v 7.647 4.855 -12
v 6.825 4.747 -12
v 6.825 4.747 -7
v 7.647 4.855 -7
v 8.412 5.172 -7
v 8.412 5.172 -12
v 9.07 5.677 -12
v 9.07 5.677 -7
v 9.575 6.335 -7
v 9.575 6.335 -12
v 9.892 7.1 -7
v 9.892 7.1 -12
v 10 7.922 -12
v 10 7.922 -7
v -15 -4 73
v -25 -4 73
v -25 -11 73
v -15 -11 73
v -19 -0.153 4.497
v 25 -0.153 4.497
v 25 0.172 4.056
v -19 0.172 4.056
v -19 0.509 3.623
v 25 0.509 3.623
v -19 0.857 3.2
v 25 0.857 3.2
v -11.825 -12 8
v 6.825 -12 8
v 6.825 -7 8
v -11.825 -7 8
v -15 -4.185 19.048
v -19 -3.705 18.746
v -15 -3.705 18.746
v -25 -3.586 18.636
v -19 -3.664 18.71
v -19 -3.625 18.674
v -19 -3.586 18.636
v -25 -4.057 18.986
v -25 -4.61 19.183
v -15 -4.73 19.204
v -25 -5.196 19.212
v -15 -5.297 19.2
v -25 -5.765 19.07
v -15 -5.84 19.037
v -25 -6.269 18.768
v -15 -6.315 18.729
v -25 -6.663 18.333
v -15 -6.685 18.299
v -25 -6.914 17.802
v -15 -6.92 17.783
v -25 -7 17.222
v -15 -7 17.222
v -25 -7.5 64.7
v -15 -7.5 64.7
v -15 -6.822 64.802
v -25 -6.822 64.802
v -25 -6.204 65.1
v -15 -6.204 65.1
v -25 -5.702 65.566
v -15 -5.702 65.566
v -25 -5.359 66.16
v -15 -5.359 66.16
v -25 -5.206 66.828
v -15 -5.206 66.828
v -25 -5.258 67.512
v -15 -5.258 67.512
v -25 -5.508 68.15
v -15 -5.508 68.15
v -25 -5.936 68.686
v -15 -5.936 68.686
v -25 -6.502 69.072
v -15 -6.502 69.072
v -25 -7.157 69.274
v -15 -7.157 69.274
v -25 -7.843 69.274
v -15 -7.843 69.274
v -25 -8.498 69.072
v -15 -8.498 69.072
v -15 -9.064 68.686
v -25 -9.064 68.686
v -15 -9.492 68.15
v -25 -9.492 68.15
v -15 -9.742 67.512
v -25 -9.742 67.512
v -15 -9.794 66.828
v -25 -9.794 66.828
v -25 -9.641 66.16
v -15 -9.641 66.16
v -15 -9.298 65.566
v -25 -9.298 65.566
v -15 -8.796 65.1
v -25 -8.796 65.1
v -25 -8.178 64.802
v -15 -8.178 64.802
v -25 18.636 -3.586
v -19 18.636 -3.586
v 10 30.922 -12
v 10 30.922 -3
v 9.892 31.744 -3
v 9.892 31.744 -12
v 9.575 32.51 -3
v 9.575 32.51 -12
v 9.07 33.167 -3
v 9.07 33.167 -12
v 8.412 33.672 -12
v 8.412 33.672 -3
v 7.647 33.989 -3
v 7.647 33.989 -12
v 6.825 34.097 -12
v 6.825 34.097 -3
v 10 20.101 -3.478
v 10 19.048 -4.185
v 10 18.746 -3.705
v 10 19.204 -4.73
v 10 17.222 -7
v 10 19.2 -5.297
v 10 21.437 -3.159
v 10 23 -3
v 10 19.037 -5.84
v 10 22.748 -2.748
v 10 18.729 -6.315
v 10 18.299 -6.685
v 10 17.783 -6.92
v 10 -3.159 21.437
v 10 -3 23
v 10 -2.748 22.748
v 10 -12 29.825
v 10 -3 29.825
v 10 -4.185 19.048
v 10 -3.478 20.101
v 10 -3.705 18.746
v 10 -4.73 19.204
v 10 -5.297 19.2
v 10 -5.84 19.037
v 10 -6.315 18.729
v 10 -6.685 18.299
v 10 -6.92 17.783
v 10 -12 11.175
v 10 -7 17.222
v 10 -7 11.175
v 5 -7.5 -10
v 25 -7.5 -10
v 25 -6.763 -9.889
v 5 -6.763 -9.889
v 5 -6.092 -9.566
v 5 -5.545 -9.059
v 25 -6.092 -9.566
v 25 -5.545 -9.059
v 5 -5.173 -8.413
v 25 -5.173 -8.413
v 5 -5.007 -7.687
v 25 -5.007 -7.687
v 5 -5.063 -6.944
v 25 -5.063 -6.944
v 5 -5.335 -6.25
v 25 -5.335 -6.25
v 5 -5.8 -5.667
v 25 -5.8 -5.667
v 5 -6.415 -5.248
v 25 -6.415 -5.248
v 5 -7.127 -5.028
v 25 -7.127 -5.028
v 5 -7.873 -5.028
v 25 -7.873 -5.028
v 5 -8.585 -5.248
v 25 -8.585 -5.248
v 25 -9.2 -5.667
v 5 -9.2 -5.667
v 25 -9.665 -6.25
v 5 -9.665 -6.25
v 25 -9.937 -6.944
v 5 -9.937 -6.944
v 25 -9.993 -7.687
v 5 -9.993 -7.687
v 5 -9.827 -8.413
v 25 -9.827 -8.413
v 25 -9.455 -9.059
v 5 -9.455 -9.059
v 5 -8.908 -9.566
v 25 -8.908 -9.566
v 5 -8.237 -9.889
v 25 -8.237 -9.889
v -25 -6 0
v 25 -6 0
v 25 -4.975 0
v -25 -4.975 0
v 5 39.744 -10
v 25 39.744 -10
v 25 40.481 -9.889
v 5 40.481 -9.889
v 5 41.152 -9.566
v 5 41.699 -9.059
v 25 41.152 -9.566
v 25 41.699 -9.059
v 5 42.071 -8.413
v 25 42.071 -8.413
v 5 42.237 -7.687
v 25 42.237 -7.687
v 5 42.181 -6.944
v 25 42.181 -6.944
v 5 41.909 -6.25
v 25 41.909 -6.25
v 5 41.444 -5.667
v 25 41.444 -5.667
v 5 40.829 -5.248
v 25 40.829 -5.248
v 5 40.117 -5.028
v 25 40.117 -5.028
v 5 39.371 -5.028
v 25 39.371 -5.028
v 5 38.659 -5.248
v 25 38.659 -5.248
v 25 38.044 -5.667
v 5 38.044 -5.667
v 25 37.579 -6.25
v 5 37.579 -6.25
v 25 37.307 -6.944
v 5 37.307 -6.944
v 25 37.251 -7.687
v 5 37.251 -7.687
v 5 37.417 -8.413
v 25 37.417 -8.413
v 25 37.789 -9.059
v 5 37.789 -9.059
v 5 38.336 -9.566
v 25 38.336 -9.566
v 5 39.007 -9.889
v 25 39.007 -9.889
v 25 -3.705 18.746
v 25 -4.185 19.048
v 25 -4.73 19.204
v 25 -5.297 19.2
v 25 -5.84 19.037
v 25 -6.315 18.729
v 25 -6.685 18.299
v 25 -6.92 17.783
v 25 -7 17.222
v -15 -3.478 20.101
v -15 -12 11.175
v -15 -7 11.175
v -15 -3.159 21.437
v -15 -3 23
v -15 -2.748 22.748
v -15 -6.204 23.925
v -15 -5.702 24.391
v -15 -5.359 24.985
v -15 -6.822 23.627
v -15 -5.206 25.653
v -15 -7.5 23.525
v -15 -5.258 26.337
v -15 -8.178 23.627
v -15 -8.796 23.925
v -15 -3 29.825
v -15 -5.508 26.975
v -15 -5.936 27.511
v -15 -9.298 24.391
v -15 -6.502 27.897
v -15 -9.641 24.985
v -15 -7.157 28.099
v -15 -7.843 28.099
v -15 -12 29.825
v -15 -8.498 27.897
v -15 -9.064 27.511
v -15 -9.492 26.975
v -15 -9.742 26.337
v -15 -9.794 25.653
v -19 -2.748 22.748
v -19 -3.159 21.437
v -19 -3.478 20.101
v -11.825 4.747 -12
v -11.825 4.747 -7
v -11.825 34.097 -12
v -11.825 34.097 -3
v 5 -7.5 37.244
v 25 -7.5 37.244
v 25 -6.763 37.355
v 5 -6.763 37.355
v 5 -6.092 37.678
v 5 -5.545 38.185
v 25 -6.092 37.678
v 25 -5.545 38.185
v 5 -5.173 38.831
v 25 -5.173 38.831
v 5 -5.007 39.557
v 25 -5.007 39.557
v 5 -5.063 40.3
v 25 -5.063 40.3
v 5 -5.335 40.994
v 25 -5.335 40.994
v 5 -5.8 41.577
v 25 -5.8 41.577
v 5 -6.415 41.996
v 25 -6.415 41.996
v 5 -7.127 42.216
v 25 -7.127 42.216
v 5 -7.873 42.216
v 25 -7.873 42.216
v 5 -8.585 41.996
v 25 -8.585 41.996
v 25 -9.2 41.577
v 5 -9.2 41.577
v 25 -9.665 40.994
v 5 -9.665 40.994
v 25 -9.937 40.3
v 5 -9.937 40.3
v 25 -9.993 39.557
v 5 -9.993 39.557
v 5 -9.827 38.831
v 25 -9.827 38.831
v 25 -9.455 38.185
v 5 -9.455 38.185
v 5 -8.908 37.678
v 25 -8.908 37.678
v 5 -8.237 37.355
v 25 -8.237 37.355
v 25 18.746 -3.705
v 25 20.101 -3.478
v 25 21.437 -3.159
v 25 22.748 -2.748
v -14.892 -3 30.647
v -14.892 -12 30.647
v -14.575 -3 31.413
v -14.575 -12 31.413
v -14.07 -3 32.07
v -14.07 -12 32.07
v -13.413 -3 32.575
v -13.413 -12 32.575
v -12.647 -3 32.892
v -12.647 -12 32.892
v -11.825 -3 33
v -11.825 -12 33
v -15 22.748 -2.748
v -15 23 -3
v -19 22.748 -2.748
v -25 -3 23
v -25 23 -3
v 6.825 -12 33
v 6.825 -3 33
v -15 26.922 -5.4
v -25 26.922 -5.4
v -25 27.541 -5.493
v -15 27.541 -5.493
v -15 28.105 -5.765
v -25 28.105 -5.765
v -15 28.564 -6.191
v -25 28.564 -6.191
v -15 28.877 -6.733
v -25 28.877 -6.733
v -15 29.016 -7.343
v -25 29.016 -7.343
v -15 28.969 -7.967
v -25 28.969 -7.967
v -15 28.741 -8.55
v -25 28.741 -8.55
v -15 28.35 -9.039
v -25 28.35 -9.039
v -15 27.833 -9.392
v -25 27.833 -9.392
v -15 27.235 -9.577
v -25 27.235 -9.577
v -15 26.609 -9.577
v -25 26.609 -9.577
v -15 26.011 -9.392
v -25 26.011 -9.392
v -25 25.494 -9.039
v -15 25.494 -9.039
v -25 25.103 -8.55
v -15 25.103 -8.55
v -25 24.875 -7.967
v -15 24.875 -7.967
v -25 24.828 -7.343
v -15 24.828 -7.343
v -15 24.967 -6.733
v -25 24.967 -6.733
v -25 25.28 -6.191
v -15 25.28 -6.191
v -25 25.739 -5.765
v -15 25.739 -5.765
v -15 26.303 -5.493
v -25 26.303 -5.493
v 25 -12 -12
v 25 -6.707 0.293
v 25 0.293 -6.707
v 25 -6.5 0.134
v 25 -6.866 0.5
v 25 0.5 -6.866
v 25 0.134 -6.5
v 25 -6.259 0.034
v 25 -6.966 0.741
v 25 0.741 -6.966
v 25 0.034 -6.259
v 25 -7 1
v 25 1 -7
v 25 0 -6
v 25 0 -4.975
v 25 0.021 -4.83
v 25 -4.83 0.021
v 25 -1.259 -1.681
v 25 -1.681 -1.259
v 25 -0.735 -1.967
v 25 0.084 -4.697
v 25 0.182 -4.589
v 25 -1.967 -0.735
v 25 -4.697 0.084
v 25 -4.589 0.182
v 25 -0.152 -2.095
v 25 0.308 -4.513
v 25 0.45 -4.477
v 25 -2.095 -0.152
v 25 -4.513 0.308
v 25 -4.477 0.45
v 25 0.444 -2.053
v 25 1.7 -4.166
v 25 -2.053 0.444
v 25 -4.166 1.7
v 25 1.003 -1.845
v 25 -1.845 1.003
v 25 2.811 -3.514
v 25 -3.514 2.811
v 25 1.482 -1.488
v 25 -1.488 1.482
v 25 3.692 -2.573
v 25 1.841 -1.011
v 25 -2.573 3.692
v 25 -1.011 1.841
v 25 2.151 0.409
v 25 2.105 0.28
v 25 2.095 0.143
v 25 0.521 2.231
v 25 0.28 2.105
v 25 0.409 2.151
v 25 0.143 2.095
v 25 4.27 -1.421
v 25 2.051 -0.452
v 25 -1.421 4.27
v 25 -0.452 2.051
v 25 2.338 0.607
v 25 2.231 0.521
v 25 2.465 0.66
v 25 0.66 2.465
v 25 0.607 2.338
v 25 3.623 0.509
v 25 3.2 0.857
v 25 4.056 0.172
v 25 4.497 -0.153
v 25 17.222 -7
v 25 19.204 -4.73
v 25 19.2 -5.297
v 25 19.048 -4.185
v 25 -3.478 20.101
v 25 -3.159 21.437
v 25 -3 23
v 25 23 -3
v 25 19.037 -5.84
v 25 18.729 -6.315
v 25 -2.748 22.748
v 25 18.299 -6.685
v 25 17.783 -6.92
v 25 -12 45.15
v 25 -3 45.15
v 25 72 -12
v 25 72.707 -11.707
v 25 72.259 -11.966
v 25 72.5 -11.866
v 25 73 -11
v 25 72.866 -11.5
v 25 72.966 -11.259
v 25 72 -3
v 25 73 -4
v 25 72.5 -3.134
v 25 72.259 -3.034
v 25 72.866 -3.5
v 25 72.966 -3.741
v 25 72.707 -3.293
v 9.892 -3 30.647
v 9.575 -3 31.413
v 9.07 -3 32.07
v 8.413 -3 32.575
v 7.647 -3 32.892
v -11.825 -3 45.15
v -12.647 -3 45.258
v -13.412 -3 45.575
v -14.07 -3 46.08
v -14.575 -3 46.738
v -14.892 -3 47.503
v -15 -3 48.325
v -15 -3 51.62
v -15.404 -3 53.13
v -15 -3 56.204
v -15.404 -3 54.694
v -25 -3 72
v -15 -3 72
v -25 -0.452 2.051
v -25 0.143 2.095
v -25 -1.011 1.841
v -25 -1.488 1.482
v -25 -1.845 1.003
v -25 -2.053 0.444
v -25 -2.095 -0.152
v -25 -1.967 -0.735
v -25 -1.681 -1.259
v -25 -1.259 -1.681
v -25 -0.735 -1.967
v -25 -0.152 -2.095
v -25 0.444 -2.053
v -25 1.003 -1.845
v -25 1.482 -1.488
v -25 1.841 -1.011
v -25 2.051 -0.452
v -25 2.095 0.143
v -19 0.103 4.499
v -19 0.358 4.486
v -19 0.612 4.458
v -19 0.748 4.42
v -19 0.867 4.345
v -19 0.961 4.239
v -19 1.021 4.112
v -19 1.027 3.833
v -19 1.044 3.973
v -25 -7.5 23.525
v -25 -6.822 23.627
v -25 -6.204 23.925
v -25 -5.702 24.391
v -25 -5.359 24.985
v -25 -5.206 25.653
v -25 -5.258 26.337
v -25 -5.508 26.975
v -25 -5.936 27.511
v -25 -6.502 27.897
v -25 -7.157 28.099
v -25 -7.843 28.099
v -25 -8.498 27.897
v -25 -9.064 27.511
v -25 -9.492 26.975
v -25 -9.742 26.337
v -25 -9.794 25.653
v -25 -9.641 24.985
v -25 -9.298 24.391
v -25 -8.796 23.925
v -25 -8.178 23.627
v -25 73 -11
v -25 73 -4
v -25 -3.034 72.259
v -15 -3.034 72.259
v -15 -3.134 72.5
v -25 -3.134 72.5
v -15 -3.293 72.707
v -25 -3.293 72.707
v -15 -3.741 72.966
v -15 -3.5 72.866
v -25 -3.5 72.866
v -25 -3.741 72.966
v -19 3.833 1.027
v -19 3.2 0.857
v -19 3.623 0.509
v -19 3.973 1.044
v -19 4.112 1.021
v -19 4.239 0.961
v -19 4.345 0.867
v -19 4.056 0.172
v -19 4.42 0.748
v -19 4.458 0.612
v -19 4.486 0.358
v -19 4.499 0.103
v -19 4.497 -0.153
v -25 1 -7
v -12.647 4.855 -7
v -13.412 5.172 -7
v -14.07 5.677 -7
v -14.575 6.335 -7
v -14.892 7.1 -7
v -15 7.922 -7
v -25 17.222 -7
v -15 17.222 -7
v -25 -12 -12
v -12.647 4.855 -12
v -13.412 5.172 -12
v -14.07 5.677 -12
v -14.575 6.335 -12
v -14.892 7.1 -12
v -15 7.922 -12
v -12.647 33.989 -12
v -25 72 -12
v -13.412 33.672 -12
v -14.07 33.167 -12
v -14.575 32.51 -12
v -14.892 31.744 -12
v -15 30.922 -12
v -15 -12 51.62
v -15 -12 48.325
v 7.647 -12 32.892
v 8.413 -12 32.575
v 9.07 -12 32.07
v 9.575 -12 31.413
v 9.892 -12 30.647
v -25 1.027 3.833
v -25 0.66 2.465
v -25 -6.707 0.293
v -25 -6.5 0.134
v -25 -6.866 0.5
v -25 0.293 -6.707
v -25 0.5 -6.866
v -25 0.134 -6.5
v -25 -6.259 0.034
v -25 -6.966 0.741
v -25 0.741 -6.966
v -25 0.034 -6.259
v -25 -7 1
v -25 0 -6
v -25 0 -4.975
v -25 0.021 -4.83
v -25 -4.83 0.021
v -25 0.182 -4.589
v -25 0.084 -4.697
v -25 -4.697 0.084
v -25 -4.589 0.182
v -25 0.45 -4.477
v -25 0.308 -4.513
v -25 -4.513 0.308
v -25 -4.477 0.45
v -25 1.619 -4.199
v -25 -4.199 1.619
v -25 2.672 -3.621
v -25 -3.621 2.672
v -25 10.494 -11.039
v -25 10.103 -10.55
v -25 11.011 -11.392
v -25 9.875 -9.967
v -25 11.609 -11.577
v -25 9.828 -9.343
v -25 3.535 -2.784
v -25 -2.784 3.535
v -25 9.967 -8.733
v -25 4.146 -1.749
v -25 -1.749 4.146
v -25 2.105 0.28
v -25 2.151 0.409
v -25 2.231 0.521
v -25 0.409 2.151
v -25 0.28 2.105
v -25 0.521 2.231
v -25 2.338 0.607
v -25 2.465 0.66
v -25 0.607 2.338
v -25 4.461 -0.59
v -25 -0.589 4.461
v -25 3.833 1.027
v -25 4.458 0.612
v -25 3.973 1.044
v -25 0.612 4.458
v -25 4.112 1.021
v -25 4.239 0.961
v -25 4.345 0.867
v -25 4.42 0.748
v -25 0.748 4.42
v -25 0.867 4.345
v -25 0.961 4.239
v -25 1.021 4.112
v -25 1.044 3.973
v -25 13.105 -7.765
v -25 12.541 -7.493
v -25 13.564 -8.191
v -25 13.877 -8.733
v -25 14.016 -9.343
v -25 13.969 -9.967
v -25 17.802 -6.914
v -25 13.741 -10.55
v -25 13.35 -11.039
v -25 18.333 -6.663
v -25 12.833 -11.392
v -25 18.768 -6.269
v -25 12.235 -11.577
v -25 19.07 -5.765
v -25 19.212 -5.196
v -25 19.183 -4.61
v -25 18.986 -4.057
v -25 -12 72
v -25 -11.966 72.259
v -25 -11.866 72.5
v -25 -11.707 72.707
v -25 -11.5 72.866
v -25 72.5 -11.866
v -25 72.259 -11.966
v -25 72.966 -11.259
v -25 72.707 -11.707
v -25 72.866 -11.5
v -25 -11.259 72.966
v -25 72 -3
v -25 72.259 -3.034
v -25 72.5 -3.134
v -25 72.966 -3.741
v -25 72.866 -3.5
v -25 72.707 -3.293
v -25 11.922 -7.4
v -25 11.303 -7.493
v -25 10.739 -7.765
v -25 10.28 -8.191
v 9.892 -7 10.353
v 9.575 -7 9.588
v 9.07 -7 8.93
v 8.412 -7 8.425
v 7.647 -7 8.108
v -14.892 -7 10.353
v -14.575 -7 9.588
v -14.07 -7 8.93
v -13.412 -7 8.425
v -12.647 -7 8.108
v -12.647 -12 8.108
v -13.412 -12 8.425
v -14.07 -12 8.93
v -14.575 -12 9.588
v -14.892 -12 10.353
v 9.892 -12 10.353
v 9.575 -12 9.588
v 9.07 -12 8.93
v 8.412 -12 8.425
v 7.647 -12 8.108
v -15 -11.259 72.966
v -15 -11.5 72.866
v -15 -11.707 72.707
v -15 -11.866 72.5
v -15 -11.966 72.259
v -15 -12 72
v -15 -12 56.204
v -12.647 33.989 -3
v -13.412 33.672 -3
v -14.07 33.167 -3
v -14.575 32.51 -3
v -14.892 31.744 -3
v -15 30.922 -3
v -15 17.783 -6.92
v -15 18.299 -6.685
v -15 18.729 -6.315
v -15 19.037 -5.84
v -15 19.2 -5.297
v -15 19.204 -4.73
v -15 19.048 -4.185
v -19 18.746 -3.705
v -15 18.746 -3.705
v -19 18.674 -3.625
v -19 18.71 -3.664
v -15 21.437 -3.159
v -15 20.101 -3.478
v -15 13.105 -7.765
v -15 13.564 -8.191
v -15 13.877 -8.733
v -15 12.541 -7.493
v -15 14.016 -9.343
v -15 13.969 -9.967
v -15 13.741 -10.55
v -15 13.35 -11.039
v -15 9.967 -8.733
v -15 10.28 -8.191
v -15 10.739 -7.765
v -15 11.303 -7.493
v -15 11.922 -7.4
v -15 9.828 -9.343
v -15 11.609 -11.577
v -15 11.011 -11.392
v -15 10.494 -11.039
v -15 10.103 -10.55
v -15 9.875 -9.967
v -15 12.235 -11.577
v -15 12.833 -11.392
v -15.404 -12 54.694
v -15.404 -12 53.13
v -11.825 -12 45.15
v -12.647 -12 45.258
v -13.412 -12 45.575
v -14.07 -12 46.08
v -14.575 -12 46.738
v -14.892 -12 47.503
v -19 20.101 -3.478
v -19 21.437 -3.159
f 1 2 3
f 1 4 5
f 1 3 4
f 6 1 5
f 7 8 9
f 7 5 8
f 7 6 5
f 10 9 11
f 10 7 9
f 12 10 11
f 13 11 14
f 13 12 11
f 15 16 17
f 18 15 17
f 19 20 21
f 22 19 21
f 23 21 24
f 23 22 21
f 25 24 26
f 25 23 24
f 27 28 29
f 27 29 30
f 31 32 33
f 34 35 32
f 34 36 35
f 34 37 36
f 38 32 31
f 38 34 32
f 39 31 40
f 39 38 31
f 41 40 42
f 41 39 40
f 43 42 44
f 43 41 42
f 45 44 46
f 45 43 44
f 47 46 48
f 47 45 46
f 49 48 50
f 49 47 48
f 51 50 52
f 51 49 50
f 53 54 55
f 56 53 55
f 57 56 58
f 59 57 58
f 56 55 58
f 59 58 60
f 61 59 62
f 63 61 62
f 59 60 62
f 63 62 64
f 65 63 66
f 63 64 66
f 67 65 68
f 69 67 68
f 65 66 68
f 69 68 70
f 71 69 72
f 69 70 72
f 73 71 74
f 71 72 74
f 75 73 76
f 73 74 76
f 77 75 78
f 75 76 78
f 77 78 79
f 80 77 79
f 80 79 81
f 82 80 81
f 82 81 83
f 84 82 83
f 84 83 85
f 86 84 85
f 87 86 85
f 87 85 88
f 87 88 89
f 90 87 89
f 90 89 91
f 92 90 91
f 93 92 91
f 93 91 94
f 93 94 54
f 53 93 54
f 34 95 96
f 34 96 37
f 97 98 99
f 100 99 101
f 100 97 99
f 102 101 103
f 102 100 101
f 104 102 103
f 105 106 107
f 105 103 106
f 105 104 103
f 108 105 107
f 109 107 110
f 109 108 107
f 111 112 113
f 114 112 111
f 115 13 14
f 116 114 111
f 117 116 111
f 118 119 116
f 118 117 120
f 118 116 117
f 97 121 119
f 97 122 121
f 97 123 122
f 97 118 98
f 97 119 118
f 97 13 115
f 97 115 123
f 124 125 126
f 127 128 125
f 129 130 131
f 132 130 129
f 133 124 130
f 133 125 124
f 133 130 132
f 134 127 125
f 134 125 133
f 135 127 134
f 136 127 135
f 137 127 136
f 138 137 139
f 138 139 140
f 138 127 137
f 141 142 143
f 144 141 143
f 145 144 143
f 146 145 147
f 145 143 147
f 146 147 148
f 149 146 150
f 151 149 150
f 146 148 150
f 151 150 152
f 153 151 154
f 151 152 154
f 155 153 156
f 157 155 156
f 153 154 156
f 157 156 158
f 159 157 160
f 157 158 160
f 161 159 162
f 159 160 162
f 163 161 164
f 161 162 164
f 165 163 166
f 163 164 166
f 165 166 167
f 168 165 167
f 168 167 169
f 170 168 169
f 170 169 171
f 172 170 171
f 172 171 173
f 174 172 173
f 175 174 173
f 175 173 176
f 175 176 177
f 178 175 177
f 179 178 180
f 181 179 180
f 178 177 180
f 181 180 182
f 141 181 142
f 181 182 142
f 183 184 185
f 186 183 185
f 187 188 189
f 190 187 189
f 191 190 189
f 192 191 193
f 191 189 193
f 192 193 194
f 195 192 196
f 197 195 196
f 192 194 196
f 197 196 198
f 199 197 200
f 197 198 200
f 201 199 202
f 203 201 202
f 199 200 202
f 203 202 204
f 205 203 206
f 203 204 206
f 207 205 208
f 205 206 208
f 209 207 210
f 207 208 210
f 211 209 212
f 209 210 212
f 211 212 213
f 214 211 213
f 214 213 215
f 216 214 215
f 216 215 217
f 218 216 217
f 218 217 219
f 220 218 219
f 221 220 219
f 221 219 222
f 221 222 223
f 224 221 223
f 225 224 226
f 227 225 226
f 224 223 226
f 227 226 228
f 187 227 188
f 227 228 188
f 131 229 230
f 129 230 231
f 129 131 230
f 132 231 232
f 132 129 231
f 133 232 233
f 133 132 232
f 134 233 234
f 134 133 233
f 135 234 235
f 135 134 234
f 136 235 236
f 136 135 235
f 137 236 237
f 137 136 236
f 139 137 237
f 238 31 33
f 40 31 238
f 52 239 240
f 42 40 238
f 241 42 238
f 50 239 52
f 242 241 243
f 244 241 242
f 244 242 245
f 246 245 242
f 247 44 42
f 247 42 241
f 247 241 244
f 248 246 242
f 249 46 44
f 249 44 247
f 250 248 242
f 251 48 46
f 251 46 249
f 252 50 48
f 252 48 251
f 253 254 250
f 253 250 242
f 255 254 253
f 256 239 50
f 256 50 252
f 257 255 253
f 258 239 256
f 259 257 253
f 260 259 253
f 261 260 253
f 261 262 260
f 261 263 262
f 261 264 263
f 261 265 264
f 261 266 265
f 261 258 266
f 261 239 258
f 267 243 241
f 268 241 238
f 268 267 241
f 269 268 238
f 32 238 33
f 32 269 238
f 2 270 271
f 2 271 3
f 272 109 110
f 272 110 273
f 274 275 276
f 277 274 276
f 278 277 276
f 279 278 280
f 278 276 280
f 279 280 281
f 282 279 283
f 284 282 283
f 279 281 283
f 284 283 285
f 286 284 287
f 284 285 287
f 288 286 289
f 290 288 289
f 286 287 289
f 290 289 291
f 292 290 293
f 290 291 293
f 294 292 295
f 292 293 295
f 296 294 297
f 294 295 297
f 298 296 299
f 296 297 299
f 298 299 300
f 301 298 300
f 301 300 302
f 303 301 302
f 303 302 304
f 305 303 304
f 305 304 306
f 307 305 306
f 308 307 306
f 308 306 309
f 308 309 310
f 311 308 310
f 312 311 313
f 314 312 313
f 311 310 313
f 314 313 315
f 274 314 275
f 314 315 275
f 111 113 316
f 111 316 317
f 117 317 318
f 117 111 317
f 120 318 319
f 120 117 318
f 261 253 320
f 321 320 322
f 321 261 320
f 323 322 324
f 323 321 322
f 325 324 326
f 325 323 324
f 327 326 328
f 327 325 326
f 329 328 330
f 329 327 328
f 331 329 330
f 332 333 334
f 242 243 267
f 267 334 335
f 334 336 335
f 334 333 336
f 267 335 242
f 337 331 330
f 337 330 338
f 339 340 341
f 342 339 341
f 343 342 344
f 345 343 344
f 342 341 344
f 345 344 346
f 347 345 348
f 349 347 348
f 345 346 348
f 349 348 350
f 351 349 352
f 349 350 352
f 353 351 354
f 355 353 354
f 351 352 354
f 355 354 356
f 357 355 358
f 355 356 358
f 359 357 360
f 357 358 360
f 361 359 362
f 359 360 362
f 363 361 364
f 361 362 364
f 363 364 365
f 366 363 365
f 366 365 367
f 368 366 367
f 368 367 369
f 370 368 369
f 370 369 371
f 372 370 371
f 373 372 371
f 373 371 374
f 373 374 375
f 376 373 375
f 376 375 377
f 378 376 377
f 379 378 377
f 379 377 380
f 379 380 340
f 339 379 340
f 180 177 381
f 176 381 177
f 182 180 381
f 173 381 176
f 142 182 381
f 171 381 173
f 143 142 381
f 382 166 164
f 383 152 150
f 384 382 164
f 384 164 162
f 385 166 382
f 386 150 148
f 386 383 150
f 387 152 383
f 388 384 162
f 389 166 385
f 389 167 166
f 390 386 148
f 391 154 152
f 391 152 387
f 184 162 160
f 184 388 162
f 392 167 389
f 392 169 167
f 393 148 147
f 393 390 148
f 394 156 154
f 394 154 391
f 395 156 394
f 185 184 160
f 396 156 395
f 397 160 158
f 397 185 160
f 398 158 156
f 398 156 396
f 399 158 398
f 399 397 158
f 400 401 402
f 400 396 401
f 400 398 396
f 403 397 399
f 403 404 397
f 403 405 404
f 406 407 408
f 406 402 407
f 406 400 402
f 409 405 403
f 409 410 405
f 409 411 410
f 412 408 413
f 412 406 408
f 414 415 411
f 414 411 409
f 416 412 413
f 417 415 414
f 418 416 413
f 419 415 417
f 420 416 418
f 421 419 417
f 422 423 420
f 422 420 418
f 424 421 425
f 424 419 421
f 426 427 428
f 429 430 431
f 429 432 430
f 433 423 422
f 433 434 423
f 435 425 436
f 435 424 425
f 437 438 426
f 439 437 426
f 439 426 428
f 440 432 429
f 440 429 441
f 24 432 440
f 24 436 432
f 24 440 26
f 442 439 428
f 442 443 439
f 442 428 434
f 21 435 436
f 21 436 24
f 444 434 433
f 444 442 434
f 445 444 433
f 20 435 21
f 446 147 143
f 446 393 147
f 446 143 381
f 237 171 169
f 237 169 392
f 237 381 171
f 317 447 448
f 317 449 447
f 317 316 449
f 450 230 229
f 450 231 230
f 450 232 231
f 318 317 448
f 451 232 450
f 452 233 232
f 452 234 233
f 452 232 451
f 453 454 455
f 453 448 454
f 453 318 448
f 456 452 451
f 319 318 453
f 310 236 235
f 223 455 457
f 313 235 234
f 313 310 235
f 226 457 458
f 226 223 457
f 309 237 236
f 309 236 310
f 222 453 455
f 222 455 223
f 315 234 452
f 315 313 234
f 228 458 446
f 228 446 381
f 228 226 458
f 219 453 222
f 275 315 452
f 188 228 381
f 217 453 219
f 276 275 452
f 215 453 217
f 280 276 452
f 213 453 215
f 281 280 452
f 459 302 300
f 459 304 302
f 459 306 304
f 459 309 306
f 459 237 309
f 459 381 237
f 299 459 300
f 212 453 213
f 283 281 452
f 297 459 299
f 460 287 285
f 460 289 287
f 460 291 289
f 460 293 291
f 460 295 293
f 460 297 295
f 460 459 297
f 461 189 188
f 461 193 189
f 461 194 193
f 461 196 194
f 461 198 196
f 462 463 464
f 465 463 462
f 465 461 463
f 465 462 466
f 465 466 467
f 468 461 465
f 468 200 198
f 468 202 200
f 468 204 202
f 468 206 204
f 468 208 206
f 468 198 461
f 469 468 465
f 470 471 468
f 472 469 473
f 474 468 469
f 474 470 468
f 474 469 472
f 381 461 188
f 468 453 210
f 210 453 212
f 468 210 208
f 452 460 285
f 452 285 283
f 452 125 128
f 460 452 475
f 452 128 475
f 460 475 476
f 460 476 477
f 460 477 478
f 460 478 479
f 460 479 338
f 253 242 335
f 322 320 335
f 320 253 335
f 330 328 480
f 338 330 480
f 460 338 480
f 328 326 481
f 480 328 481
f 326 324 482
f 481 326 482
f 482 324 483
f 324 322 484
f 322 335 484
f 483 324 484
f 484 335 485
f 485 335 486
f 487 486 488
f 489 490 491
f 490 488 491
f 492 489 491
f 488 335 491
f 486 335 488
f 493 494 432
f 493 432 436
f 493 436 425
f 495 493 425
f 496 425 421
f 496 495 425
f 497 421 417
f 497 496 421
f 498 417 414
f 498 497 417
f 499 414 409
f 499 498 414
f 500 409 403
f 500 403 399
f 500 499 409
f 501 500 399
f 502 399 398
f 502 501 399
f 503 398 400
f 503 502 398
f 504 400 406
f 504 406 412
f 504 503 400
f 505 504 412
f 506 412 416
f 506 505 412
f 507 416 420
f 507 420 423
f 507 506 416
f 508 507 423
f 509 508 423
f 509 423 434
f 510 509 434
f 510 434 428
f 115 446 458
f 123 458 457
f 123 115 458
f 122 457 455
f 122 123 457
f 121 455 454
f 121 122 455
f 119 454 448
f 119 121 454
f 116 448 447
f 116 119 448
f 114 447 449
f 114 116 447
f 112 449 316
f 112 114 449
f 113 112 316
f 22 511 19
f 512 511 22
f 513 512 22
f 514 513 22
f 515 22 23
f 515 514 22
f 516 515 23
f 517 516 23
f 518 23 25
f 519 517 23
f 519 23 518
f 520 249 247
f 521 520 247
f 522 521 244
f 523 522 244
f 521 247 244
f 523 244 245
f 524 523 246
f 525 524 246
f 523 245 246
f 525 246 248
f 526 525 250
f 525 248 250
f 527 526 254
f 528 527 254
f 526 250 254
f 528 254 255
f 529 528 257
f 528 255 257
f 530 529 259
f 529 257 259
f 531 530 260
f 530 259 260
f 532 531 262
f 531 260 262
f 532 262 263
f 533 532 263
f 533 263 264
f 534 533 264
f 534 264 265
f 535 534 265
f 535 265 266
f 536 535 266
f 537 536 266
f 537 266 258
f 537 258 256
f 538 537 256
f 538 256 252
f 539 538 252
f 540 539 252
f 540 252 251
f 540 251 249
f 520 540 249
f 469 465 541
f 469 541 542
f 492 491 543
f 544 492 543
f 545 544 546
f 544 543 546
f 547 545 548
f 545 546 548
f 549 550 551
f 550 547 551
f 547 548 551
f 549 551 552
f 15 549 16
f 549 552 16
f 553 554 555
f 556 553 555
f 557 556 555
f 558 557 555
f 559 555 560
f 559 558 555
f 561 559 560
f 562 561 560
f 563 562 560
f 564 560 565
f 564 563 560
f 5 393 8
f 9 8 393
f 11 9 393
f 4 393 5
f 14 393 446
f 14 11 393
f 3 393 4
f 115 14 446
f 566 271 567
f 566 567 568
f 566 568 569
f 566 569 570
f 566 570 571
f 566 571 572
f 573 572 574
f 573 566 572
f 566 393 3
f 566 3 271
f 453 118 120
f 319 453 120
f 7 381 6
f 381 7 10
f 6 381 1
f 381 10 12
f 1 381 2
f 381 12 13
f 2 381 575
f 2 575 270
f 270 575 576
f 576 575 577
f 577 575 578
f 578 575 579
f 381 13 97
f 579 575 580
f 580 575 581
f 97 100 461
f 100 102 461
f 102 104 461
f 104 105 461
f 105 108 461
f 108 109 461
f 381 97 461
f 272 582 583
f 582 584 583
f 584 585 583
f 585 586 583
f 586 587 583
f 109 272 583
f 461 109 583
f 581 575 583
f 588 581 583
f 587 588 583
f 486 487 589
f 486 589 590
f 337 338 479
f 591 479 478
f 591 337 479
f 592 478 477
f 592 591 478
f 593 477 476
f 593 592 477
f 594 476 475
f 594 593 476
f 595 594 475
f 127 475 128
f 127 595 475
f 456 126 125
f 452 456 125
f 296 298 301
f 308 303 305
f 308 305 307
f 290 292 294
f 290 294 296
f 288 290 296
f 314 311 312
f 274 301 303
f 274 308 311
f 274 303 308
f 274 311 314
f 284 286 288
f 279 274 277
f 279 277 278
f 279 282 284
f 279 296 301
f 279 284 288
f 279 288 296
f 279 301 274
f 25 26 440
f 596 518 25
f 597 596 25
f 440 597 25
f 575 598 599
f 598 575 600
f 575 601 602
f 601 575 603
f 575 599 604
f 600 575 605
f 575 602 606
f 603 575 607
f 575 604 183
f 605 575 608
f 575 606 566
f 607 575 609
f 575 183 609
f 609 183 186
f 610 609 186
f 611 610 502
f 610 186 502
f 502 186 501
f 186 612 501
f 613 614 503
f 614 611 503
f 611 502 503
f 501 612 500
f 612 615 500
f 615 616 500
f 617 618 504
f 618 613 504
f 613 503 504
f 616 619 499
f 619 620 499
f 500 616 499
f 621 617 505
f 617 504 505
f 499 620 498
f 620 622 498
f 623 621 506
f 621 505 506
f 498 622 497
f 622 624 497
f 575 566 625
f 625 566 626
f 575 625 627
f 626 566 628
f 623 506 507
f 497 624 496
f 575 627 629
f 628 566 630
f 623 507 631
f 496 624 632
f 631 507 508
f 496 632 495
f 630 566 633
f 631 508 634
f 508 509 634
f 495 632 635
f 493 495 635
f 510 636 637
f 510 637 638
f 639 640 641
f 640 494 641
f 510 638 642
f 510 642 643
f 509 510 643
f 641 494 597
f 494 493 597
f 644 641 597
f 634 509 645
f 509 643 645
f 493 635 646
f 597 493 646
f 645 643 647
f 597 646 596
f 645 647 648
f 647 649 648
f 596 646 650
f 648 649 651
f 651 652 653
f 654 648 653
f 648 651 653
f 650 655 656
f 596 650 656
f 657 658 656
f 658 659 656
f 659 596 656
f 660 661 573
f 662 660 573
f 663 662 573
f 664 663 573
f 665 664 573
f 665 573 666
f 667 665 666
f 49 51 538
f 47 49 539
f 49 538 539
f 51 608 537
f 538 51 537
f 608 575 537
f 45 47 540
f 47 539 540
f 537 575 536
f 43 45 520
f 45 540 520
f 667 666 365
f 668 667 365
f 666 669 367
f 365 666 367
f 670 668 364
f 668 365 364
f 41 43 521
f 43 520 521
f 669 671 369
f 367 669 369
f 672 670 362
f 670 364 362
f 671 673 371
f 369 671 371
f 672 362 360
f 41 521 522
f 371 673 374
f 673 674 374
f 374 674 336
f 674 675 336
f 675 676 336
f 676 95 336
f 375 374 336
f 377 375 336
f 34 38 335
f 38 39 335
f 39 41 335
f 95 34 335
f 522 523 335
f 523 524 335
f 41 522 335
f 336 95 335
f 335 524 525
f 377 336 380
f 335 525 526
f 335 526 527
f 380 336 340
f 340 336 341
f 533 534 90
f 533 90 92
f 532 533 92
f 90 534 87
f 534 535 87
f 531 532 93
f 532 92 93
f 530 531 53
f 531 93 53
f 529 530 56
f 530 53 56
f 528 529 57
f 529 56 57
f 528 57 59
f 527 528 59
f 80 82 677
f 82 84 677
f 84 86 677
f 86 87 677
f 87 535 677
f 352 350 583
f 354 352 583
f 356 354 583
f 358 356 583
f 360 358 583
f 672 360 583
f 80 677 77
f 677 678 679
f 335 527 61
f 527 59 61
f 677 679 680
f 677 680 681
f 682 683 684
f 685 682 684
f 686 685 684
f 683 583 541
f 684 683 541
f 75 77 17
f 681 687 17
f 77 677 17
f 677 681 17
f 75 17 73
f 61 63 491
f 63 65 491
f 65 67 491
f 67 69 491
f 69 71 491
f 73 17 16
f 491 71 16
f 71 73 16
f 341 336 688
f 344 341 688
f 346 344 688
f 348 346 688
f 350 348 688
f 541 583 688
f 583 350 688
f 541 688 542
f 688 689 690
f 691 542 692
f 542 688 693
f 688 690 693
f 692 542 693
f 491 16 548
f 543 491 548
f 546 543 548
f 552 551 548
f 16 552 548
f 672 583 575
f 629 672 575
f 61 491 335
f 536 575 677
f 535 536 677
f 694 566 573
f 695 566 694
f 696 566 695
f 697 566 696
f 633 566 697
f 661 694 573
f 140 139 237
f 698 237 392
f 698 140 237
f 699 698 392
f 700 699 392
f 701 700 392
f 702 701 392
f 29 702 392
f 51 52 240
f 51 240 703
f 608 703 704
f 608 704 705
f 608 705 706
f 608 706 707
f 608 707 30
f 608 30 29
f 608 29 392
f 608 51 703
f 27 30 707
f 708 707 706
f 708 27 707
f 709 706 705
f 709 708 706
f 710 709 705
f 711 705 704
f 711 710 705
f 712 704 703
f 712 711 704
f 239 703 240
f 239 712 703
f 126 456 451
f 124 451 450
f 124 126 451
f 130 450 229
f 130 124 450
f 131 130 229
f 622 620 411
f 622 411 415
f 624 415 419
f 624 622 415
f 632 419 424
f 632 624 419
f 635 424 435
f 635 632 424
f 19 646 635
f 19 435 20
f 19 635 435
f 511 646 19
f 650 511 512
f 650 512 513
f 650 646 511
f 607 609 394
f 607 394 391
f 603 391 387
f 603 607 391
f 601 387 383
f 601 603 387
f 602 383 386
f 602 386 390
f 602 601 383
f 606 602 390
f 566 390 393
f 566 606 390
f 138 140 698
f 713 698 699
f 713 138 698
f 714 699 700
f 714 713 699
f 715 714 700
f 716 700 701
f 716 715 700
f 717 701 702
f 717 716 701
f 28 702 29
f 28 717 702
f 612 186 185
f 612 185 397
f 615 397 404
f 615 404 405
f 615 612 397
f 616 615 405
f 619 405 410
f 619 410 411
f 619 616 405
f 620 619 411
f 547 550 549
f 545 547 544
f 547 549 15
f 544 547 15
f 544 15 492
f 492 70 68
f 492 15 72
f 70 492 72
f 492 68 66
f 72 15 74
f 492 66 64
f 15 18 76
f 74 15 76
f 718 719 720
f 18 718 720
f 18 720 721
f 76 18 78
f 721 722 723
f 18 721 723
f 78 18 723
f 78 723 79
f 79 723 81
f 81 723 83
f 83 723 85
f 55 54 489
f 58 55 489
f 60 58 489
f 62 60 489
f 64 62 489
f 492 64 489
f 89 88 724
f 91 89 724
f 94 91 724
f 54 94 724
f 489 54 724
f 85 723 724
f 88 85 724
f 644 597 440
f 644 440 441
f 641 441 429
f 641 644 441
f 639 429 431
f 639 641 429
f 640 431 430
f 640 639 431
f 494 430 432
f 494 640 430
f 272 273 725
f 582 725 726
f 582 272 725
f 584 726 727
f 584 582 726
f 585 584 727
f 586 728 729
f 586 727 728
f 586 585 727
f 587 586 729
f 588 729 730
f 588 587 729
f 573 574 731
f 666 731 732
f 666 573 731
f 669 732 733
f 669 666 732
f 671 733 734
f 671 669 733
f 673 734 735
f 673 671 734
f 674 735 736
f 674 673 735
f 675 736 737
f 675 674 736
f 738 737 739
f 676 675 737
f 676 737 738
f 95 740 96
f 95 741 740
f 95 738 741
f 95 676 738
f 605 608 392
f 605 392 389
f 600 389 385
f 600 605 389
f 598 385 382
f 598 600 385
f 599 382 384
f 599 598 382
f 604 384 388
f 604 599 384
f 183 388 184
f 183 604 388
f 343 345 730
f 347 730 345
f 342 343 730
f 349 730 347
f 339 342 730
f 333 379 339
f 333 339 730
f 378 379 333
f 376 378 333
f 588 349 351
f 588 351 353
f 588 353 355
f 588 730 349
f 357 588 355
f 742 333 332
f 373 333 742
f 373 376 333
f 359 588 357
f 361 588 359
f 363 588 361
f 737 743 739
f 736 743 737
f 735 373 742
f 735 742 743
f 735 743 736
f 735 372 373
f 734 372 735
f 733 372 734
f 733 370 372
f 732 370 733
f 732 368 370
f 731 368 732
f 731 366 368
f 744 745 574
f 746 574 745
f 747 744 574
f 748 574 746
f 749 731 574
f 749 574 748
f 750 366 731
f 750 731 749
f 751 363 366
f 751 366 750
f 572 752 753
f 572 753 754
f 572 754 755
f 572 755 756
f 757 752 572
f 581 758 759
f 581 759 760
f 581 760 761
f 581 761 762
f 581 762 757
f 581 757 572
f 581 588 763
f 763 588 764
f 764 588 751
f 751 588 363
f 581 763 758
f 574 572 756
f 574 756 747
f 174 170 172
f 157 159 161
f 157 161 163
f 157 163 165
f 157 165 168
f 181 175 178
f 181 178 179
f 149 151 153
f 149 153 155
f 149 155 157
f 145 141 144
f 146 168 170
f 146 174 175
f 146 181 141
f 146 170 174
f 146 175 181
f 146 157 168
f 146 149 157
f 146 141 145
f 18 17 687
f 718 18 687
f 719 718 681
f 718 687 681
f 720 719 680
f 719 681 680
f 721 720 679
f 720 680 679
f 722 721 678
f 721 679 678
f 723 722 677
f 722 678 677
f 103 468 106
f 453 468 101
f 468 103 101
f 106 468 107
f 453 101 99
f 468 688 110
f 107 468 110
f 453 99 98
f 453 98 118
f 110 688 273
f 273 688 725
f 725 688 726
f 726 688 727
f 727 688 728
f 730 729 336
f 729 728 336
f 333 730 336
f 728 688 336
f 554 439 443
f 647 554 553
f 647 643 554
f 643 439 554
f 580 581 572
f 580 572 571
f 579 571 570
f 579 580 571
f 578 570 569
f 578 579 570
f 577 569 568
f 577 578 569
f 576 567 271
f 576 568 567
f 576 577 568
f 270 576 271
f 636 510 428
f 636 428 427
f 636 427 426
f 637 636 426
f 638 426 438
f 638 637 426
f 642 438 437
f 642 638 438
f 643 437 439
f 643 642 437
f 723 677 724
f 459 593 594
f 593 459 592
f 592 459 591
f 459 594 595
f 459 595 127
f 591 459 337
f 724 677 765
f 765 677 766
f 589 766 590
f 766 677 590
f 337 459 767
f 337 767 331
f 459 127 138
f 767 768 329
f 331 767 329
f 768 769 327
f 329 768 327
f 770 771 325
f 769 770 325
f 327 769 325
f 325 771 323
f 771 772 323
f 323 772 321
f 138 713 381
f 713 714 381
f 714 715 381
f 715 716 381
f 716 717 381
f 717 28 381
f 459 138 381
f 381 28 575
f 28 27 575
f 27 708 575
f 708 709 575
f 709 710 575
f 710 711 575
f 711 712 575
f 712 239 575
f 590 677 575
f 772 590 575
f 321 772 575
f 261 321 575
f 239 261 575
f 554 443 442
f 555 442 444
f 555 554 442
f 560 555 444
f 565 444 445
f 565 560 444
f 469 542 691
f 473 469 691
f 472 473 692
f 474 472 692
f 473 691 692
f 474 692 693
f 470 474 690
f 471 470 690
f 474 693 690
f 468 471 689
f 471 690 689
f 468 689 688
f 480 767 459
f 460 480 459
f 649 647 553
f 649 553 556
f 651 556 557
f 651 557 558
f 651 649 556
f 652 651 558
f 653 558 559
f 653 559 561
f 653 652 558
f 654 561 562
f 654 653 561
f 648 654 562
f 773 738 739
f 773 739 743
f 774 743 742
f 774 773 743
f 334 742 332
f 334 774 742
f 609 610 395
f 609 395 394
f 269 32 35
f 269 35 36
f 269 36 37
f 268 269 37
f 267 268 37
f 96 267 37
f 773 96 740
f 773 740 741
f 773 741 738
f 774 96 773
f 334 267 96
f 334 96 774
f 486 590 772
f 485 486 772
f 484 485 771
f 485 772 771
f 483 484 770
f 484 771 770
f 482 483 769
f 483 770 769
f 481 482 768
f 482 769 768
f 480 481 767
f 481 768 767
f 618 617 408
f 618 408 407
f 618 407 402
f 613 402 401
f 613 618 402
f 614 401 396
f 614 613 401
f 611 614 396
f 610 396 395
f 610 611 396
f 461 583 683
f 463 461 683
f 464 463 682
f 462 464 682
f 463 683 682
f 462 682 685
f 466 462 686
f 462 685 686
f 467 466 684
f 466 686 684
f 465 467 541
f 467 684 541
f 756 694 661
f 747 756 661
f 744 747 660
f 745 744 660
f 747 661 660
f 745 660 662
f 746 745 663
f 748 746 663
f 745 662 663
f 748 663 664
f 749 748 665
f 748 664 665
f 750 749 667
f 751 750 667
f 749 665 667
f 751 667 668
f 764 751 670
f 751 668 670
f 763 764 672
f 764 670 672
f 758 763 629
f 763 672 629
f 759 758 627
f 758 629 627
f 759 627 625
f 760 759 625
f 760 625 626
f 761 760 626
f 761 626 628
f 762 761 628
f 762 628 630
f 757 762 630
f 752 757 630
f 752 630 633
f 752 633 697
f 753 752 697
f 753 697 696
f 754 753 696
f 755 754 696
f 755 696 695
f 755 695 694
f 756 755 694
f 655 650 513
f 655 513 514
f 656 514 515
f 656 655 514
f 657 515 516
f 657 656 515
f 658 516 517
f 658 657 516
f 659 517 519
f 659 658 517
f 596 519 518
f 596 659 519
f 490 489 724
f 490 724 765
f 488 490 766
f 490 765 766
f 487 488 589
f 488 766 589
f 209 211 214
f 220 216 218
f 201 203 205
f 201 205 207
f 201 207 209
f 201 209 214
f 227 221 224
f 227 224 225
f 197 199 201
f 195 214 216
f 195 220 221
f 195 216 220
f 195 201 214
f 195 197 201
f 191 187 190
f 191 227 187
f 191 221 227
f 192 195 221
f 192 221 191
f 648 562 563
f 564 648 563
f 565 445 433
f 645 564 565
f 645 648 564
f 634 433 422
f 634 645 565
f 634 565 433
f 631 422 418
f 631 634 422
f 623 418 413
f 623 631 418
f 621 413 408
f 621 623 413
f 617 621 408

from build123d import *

# Parameters (mm, degrees)
STRUCTURAL_MEMBER1_DEPTH = 50
SKETCH16_R               = 2.5
CUT_EXTRUDE2_DEPTH       = 20
CUT_EXTRUDE7_REACH       = 116.8
CUT_EXTRUDE8_REACH       = 116.708
SKETCH23_R               = 2.1
CUT_EXTRUDE9_REACH       = 116.8
CUT_EXTRUDE10_REACH      = 112.716
SKETCH25_R               = 2.3
SKETCH26_R               = 6
CUT_EXTRUDE11_DEPTH      = 115.799827021


with BuildPart() as part:
    # Sketch14 → Structural Member1 (new body)
    with BuildSketch(Plane.YZ.offset(-25)):
        with BuildLine():
            Line((-11.999992417, -11.999998055), (72.000007583, -11.999998055))
            ThreePointArc((72.000007583, -11.999998055), (72.707114364, -11.707104836), (73.000007583, -10.999998055))
            Line((73.000007583, -10.999998055), (73.000007583, -3.999995305))
            ThreePointArc((73.000007583, -3.999995305), (72.707113392, -3.292890301), (72.000007583, -2.999998055))
            Line((72.000007583, -2.999998055), (23.000007583, -2.999998055))
            Line((23.000007583, -2.999998055), (-2.999992417, 23.000001945))
            Line((-2.999992417, 23.000001945), (-2.999992417, 72.000001945))
            ThreePointArc((-2.999992417, 72.000001945), (-3.292885636, 72.707108727), (-3.999992417, 73.000001945))
            Line((-3.999992417, 73.000001945), (-10.999992417, 73.000001945))
            ThreePointArc((-10.999992417, 73.000001945), (-11.707099198, 72.707108727), (-11.999992417, 72.000001945))
            Line((-11.999992417, 72.000001945), (-11.999992417, -11.999998055))
        make_face()
        with BuildLine():
            Line((0.999999969, -6.999999689), (17.221834624, -6.999999689))
            ThreePointArc((17.221834624, -6.999999689), (19.069593689, -5.765366553), (18.636048187, -3.585786126))
            Line((18.636048187, -3.585786126), (-3.585808896, 18.636070956))
            ThreePointArc((-3.585808896, 18.636070956), (-5.765389323, 19.069616459), (-7.000022459, 17.221857394))
            Line((-7.000022459, 17.221857394), (-7.000022459, 1.000002257))
            ThreePointArc((-7.000022459, 1.000002257), (-6.707129334, 0.29289557), (-6.000022726, 2.257e-06))
            Line((-6.000022726, 2.257e-06), (-4.974936959, 2.257e-06))
            ThreePointArc((-4.974936959, 2.257e-06), (-4.639527617, 0.129191559), (-4.477443471, 0.449999963))
            ThreePointArc((-4.477443471, 0.449999963), (-2.784112909, 3.535352218), (0.612237786, 4.458157119))
            ThreePointArc((0.612237786, 4.458157119), (0.960727975, 4.239434815), (1.027186757, 3.833395301))
            Line((1.027186757, 3.833395301), (0.660400741, 2.464528966))
            ThreePointArc((0.660400741, 2.464528966), (0.468097556, 2.187100615), (0.143315125, 2.095104001))
            ThreePointArc((0.143315125, 2.095104001), (-1.484932492, -1.484915989), (2.095105594, 0.14329184))
            ThreePointArc((2.095105594, 0.14329184), (2.18710419, 0.46807097), (2.464530895, 0.6603719))
            Line((2.464530895, 0.6603719), (3.83339913, 1.027158555))
            ThreePointArc((3.83339913, 1.027158555), (4.2394351, 0.960702167), (4.458159824, 0.612218085))
            ThreePointArc((4.458159824, 0.612218085), (3.535346067, -2.784120721), (0.449999963, -4.477443471))
            ThreePointArc((0.449999963, -4.477443471), (0.129190042, -4.639526994), (-3.1e-08, -4.974937189))
            Line((-3.1e-08, -4.974937189), (-3.1e-08, -5.999999623))
            ThreePointArc((-3.1e-08, -5.999999623), (0.292893164, -6.707106447), (0.999999969, -6.999999689))
        make_face(mode=Mode.SUBTRACT)
    extrude(amount=STRUCTURAL_MEMBER1_DEPTH)

    # Sketch16 → Cut-Extrude2 (cut)
    with BuildSketch(Plane(origin=(25, 0, 0), x_dir=(0, 0, -1), z_dir=(1, 0, 0))):
        with Locations((7.499998055, -7.499992417)):
            Circle(SKETCH16_R)
        with Locations((-39.744001945, -7.499992417)):
            Circle(SKETCH16_R)
        with Locations((7.499998055, 39.744007583)):
            Circle(SKETCH16_R)
    extrude(amount=-CUT_EXTRUDE2_DEPTH, mode=Mode.SUBTRACT)

    # Sketch18 → Cut-Revolve1 (revolve, cut)
    with BuildSketch(Plane(origin=(0, 2.977207172, 29.266802357), x_dir=(-1, 0, 0), z_dir=(0, 0.7071067811865477, 0.7071067811865475))):
        Polygon((-25, -38.589555017), (19, -38.589555017), (19, -21.764555017), (25, -21.764555017), (25, -18.589555017), (-25, -18.589555017), align=None)
    revolve(axis=Axis((25, 16.122007583, 16.122001945), (1, 0, 0)), mode=Mode.SUBTRACT)

    # Sketch22 → Cut-Extrude7 (cut, up to next)
    with BuildSketch(Plane(origin=(0, 0, -11.999998055), x_dir=(-1, 0, 0), z_dir=(0, 0, -1)), mode=Mode.PRIVATE) as cut_extrude7_sk1:
        with BuildLine():
            Line((11.825, 4.747007583), (-6.825, 4.747007583))
            ThreePointArc((-6.825, 4.747007583), (-9.07006403, 5.676943553), (-10, 7.922007583))
            Line((-10, 7.922007583), (-10, 30.922007583))
            ThreePointArc((-10, 30.922007583), (-9.07006403, 33.167071613), (-6.825, 34.097007583))
            Line((-6.825, 34.097007583), (11.825, 34.097007583))
            ThreePointArc((11.825, 34.097007583), (14.07006403, 33.167071613), (15, 30.922007583))
            Line((15, 30.922007583), (15, 7.922007583))
            ThreePointArc((15, 7.922007583), (14.07006403, 5.676943553), (11.825, 4.747007583))
        make_face()
    cut_extrude7_tool1 = extrude(cut_extrude7_sk1.sketch, amount=-CUT_EXTRUDE7_REACH, mode=Mode.PRIVATE) & part.part
    add(cut_extrude7_tool1.solids().sort_by_distance((-2.5, 19.422008, -11.999998))[0], mode=Mode.SUBTRACT)

    # Sketch23 → Cut-Extrude8 (cut, up to next)
    with BuildSketch(Plane.ZY.offset(25), mode=Mode.PRIVATE) as cut_extrude8_sk1:
        with Locations((-9.499998872, 11.922007583)):
            Circle(SKETCH23_R)
    cut_extrude8_tool1 = extrude(cut_extrude8_sk1.sketch, amount=-CUT_EXTRUDE8_REACH, mode=Mode.PRIVATE) & part.part
    # Sketch23 → Cut-Extrude8 (cut, up to next)
    with BuildSketch(Plane.ZY.offset(25), mode=Mode.PRIVATE) as cut_extrude8_sk2:
        with Locations((-7.499998055, 26.922007583)):
            Circle(SKETCH23_R)
    cut_extrude8_tool2 = extrude(cut_extrude8_sk2.sketch, amount=-CUT_EXTRUDE8_REACH, mode=Mode.PRIVATE) & part.part
    add(cut_extrude8_tool1.solids().sort_by_distance((-25, 11.922008, -9.499999))[0], mode=Mode.SUBTRACT)
    add(cut_extrude8_tool2.solids().sort_by_distance((-25, 26.922008, -7.499998))[0], mode=Mode.SUBTRACT)

    # Sketch24 → Cut-Extrude9 (cut, up to next)
    with BuildSketch(Plane.XZ.offset(11.999992417), mode=Mode.PRIVATE) as cut_extrude9_sk1:
        with BuildLine():
            Line((6.825, 8.000001945), (-11.825, 8.000001945))
            ThreePointArc((-11.825, 8.000001945), (-14.07006403, 8.929937915), (-15, 11.175001945))
            Line((-15, 11.175001945), (-15, 29.825001945))
            ThreePointArc((-15, 29.825001945), (-14.07006403, 32.070065976), (-11.825, 33.000001945))
            Line((-11.825, 33.000001945), (6.825, 33.000001945))
            ThreePointArc((6.825, 33.000001945), (9.07006403, 32.070065976), (10, 29.825001945))
            Line((10, 29.825001945), (10, 11.175001945))
            ThreePointArc((10, 11.175001945), (9.07006403, 8.929937915), (6.825, 8.000001945))
        make_face()
    cut_extrude9_tool1 = extrude(cut_extrude9_sk1.sketch, amount=-CUT_EXTRUDE9_REACH, mode=Mode.PRIVATE) & part.part
    # Sketch24 → Cut-Extrude9 (cut, up to next)
    with BuildSketch(Plane.XZ.offset(11.999992417), mode=Mode.PRIVATE) as cut_extrude9_sk2:
        with BuildLine():
            Line((25, 73.000001945), (-15, 73.000001945))
            Line((-15, 73.000001945), (-15, 48.325001945))
            ThreePointArc((-15, 48.325001945), (-14.07006403, 46.079937915), (-11.825, 45.150001945))
            Line((-11.825, 45.150001945), (25, 45.150001945))
            Line((25, 45.150001945), (25, 73.000001945))
        make_face()
    cut_extrude9_tool2 = extrude(cut_extrude9_sk2.sketch, amount=-CUT_EXTRUDE9_REACH, mode=Mode.PRIVATE) & part.part
    add(cut_extrude9_tool1.solids().sort_by_distance((-2.5, -11.999992, 20.500002))[0], mode=Mode.SUBTRACT)
    add(cut_extrude9_tool2.solids().sort_by_distance((5.037534, -11.999992, 59.100716))[0], mode=Mode.SUBTRACT)

    # Sketch25 → Cut-Extrude10 (cut, up to next)
    with BuildSketch(Plane(origin=(-15, 0, 0), x_dir=(0, 0, -1), z_dir=(1, 0, 0)), mode=Mode.PRIVATE) as cut_extrude10_sk1:
        with Locations((-67.000001945, -7.499992417)):
            Circle(SKETCH25_R)
    cut_extrude10_tool1 = extrude(cut_extrude10_sk1.sketch, amount=-CUT_EXTRUDE10_REACH, mode=Mode.PRIVATE) & part.part
    # Sketch25 → Cut-Extrude10 (cut, up to next)
    with BuildSketch(Plane(origin=(-15, 0, 0), x_dir=(0, 0, -1), z_dir=(1, 0, 0)), mode=Mode.PRIVATE) as cut_extrude10_sk2:
        with Locations((-25.825001945, -7.499992417)):
            Circle(SKETCH25_R)
    cut_extrude10_tool2 = extrude(cut_extrude10_sk2.sketch, amount=-CUT_EXTRUDE10_REACH, mode=Mode.PRIVATE) & part.part
    add(cut_extrude10_tool1.solids().sort_by_distance((-15, -7.499992, 67.000002))[0], mode=Mode.SUBTRACT)
    add(cut_extrude10_tool2.solids().sort_by_distance((-15, -7.499992, 25.825002))[0], mode=Mode.SUBTRACT)

    # Sketch26 → Cut-Extrude11 (cut, through all)
    with BuildSketch(Plane.XZ.offset(11.999992417)):
        with Locations((-9.455, 53.912001945)):
            Circle(SKETCH26_R)
    extrude(amount=-CUT_EXTRUDE11_DEPTH, mode=Mode.SUBTRACT)


solid = part.part
